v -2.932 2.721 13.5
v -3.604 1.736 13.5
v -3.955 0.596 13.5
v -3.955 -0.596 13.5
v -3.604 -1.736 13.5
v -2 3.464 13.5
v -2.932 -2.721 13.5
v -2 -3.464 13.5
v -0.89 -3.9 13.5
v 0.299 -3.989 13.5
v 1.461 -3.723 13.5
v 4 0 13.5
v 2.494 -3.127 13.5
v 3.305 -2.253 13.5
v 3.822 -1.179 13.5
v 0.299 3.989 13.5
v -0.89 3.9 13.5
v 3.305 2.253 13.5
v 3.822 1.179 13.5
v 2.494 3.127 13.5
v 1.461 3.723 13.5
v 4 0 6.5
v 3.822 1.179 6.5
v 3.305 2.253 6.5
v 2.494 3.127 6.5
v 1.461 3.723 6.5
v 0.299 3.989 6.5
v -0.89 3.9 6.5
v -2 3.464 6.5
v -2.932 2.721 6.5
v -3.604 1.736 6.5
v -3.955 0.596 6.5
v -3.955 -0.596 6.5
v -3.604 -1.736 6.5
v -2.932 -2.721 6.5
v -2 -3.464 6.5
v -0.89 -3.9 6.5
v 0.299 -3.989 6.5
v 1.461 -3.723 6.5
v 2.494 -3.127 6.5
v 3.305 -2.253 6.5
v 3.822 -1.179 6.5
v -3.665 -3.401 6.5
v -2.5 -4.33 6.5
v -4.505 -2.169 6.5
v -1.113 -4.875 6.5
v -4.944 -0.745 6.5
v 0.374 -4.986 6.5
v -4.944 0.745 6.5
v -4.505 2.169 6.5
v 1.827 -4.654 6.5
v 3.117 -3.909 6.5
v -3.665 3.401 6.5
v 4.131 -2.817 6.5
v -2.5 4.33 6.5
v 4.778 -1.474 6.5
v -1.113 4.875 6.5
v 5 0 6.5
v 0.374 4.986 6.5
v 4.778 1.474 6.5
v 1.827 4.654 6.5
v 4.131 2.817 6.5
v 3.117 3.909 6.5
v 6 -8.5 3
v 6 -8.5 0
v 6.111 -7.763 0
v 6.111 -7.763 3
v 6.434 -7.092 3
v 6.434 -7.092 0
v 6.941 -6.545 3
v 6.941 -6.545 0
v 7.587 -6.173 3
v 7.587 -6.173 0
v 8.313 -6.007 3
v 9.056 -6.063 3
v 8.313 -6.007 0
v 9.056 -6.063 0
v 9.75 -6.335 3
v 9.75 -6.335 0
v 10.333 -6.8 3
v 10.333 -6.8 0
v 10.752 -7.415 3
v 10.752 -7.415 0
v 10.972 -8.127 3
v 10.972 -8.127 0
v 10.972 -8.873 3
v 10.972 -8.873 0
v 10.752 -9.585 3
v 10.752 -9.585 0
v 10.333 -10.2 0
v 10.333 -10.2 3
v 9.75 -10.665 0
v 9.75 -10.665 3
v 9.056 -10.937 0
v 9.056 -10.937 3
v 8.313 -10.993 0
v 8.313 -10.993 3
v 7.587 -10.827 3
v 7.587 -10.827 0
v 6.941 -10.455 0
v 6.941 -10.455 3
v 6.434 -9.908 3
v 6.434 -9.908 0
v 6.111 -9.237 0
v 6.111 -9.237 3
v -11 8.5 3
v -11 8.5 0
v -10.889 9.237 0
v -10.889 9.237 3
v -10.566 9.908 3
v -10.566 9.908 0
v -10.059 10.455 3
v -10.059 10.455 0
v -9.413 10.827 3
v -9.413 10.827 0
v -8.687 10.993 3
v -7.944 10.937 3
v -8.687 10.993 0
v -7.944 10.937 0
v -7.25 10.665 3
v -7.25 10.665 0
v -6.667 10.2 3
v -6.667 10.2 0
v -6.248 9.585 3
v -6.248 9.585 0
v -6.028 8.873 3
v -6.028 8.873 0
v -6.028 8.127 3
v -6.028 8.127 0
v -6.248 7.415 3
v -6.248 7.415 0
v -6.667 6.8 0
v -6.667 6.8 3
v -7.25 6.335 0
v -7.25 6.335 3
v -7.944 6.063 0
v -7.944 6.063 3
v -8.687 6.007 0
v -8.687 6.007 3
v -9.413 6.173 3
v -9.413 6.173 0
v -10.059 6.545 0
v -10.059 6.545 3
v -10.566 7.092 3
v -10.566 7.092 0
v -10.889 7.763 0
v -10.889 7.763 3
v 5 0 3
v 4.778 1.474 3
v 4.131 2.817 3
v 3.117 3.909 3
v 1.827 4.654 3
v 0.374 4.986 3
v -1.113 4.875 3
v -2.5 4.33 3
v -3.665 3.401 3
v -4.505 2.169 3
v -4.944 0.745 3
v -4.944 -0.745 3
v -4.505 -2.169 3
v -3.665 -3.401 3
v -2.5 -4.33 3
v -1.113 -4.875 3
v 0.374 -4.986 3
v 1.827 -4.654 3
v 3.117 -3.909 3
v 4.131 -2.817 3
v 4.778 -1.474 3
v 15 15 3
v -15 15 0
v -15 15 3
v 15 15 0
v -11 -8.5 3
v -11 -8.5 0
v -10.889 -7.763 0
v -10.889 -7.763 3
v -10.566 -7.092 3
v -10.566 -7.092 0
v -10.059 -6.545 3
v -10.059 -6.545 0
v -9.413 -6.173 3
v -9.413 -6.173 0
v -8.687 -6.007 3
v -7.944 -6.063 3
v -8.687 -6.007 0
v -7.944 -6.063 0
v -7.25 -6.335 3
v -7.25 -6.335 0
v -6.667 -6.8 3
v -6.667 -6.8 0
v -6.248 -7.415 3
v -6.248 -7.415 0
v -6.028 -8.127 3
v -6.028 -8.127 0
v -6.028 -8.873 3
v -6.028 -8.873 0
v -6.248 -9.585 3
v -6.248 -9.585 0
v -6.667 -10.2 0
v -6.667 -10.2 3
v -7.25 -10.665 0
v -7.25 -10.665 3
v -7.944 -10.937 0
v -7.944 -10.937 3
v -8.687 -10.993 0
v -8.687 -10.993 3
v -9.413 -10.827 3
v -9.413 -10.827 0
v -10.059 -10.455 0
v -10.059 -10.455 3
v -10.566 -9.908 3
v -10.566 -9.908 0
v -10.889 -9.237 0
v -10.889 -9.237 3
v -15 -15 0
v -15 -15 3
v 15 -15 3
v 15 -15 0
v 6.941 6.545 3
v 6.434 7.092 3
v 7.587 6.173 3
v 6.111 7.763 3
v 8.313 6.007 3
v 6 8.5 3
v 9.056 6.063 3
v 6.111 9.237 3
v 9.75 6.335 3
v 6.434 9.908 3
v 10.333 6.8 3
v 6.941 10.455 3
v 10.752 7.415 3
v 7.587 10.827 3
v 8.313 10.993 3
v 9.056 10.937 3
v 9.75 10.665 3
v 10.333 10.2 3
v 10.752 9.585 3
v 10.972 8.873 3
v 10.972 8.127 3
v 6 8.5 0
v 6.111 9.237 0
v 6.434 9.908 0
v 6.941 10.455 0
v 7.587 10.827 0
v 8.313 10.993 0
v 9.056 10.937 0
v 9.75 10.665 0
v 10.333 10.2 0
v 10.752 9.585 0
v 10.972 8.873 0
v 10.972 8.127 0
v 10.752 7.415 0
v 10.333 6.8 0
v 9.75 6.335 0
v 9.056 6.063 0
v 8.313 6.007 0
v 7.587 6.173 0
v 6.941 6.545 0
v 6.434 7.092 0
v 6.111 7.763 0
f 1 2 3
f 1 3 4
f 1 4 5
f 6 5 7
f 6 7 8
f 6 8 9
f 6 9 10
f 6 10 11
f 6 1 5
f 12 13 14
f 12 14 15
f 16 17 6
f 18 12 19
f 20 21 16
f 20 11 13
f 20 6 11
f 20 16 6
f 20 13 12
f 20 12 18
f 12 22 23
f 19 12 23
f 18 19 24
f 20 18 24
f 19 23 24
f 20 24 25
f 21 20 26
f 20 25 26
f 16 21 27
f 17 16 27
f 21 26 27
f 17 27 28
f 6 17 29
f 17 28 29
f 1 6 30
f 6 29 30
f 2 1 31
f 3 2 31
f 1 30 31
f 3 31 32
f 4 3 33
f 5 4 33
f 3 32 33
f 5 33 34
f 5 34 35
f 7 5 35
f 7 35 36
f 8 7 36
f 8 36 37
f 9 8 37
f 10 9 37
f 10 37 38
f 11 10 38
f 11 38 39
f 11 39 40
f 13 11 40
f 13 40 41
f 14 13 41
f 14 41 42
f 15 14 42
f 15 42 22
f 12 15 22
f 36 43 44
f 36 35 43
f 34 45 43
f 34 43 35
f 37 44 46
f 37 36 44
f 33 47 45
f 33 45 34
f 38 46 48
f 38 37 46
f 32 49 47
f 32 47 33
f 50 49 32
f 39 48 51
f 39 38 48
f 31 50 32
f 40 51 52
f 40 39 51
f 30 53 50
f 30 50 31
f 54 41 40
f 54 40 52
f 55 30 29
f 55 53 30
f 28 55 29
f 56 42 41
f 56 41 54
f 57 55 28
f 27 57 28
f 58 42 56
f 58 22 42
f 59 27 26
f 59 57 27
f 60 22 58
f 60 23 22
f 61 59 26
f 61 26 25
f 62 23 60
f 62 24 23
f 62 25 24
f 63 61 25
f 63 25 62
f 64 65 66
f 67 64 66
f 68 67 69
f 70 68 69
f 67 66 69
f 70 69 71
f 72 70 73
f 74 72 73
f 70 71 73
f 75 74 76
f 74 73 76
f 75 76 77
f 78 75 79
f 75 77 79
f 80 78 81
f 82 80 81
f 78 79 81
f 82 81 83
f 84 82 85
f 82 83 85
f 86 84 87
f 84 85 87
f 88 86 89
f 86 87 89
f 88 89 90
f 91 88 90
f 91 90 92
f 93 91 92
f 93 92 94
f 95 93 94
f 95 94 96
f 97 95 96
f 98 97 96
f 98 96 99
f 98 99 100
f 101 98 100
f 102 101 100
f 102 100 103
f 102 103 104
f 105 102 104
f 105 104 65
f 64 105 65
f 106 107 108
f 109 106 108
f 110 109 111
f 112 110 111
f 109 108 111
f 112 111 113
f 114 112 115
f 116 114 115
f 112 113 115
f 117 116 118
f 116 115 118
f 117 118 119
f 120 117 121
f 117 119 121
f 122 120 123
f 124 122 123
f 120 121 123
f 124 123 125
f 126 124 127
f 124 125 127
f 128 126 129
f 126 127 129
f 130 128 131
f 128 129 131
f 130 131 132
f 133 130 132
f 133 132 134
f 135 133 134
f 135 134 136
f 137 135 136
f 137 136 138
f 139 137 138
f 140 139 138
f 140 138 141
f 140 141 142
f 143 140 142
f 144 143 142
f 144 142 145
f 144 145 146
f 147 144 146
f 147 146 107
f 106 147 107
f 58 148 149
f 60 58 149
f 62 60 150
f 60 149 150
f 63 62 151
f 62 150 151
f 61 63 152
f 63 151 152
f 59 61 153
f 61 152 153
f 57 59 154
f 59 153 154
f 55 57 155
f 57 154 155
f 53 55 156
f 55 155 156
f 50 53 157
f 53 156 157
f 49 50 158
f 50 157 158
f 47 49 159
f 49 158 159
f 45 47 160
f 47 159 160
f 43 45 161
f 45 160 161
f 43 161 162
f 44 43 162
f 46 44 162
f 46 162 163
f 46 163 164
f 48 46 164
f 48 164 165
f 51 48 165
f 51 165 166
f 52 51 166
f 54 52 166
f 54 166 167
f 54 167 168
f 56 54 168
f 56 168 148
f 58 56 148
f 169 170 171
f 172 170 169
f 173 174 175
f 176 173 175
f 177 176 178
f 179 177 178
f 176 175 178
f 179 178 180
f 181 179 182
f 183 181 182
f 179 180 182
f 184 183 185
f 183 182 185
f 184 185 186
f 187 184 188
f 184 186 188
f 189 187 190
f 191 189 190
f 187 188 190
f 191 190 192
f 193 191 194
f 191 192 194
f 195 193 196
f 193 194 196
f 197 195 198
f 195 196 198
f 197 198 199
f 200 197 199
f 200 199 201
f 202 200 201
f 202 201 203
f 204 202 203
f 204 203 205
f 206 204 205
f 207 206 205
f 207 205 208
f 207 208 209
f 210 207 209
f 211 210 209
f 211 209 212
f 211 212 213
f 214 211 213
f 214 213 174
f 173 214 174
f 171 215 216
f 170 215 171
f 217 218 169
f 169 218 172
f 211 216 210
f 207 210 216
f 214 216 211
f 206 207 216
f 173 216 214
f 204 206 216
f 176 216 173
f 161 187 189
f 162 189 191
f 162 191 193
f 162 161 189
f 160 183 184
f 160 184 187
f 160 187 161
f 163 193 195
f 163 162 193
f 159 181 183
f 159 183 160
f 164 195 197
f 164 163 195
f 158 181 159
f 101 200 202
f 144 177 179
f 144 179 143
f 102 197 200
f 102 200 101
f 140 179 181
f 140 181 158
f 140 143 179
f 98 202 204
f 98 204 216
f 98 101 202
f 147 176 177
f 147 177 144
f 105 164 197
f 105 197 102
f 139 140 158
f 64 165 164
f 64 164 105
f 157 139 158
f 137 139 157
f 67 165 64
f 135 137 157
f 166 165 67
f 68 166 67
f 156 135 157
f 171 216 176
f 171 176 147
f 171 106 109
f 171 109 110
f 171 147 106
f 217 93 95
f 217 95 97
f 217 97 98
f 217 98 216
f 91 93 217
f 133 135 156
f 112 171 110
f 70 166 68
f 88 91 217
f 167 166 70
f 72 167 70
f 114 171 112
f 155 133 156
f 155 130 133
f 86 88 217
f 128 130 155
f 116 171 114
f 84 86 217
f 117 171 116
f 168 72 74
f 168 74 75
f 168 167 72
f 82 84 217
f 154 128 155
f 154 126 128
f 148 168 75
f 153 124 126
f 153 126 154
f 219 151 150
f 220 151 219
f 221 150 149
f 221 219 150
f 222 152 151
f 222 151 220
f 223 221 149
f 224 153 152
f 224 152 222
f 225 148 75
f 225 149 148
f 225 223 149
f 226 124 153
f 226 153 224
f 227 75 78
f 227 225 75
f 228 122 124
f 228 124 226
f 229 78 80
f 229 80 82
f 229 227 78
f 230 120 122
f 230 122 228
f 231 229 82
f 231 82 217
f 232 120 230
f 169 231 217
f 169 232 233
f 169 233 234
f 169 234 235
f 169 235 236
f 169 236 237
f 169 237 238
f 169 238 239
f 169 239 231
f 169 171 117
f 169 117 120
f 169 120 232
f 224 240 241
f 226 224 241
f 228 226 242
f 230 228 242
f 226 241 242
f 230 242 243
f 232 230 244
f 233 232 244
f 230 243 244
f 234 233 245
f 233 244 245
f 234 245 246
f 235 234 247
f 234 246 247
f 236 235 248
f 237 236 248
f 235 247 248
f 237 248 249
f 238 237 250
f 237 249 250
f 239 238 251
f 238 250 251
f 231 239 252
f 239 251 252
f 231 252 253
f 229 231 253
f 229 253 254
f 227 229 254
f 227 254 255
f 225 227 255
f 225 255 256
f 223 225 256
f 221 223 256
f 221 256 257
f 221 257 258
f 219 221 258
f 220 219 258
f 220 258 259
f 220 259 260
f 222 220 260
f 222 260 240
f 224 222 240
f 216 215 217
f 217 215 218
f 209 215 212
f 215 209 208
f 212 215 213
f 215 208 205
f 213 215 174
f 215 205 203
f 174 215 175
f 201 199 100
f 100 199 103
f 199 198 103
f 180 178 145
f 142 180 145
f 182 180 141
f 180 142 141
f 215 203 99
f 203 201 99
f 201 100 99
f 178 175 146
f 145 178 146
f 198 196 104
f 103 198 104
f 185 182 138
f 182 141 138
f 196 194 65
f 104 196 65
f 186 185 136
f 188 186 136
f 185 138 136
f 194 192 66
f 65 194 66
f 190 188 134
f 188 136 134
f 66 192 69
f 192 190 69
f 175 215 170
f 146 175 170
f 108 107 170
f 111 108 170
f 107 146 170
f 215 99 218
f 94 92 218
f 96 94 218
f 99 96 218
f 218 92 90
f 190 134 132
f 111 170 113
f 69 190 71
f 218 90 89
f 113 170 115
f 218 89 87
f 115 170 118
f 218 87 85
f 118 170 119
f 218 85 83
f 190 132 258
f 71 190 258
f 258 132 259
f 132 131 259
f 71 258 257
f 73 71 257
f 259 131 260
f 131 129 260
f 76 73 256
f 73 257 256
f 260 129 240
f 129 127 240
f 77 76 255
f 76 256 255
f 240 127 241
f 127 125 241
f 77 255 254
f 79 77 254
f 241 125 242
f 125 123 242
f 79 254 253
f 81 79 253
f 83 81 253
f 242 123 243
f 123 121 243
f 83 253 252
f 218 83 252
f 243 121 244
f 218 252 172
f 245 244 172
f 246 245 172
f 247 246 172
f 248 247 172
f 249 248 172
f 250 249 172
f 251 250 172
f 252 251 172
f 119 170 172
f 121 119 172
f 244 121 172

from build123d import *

# Parameters (mm, degrees)
F0_W     = 30
F0_H     = 30
F0_R     = 5
F1_DEPTH = 3
F0_R_2   = 4
F2_DEPTH = 6.5
F3_DEPTH = 13.5
F5_D     = 5


with BuildPart() as f1:
    # F0 (on Top) → F1 (new body)
    with BuildSketch(Plane.XY):
        Rectangle(F0_W, F0_H)
        Circle(F0_R, mode=Mode.SUBTRACT)
    extrude(amount=F1_DEPTH)

    # F0 (on Top) → F2 (join)
    with BuildSketch(Plane.XY):
        Circle(F0_R)
        Circle(F0_R_2, mode=Mode.SUBTRACT)
    extrude(amount=F2_DEPTH)

    # F0 (on Top) → F3 (join)
    with BuildSketch(Plane.XY):
        Circle(F0_R_2)
    extrude(amount=F3_DEPTH)

    # F5 (through all)
    with Locations(Plane.XY.offset(3)):
        with Locations((8.5, 8.5), (-8.5, 8.5), (-8.5, -8.5), (8.5, -8.5)):
            Hole(F5_D / 2)


with BuildPart() as f6_1:
    # F6: copy of F1
    add(f1.part.moved(Location((50, 0, 0))))


solid = f1.part
